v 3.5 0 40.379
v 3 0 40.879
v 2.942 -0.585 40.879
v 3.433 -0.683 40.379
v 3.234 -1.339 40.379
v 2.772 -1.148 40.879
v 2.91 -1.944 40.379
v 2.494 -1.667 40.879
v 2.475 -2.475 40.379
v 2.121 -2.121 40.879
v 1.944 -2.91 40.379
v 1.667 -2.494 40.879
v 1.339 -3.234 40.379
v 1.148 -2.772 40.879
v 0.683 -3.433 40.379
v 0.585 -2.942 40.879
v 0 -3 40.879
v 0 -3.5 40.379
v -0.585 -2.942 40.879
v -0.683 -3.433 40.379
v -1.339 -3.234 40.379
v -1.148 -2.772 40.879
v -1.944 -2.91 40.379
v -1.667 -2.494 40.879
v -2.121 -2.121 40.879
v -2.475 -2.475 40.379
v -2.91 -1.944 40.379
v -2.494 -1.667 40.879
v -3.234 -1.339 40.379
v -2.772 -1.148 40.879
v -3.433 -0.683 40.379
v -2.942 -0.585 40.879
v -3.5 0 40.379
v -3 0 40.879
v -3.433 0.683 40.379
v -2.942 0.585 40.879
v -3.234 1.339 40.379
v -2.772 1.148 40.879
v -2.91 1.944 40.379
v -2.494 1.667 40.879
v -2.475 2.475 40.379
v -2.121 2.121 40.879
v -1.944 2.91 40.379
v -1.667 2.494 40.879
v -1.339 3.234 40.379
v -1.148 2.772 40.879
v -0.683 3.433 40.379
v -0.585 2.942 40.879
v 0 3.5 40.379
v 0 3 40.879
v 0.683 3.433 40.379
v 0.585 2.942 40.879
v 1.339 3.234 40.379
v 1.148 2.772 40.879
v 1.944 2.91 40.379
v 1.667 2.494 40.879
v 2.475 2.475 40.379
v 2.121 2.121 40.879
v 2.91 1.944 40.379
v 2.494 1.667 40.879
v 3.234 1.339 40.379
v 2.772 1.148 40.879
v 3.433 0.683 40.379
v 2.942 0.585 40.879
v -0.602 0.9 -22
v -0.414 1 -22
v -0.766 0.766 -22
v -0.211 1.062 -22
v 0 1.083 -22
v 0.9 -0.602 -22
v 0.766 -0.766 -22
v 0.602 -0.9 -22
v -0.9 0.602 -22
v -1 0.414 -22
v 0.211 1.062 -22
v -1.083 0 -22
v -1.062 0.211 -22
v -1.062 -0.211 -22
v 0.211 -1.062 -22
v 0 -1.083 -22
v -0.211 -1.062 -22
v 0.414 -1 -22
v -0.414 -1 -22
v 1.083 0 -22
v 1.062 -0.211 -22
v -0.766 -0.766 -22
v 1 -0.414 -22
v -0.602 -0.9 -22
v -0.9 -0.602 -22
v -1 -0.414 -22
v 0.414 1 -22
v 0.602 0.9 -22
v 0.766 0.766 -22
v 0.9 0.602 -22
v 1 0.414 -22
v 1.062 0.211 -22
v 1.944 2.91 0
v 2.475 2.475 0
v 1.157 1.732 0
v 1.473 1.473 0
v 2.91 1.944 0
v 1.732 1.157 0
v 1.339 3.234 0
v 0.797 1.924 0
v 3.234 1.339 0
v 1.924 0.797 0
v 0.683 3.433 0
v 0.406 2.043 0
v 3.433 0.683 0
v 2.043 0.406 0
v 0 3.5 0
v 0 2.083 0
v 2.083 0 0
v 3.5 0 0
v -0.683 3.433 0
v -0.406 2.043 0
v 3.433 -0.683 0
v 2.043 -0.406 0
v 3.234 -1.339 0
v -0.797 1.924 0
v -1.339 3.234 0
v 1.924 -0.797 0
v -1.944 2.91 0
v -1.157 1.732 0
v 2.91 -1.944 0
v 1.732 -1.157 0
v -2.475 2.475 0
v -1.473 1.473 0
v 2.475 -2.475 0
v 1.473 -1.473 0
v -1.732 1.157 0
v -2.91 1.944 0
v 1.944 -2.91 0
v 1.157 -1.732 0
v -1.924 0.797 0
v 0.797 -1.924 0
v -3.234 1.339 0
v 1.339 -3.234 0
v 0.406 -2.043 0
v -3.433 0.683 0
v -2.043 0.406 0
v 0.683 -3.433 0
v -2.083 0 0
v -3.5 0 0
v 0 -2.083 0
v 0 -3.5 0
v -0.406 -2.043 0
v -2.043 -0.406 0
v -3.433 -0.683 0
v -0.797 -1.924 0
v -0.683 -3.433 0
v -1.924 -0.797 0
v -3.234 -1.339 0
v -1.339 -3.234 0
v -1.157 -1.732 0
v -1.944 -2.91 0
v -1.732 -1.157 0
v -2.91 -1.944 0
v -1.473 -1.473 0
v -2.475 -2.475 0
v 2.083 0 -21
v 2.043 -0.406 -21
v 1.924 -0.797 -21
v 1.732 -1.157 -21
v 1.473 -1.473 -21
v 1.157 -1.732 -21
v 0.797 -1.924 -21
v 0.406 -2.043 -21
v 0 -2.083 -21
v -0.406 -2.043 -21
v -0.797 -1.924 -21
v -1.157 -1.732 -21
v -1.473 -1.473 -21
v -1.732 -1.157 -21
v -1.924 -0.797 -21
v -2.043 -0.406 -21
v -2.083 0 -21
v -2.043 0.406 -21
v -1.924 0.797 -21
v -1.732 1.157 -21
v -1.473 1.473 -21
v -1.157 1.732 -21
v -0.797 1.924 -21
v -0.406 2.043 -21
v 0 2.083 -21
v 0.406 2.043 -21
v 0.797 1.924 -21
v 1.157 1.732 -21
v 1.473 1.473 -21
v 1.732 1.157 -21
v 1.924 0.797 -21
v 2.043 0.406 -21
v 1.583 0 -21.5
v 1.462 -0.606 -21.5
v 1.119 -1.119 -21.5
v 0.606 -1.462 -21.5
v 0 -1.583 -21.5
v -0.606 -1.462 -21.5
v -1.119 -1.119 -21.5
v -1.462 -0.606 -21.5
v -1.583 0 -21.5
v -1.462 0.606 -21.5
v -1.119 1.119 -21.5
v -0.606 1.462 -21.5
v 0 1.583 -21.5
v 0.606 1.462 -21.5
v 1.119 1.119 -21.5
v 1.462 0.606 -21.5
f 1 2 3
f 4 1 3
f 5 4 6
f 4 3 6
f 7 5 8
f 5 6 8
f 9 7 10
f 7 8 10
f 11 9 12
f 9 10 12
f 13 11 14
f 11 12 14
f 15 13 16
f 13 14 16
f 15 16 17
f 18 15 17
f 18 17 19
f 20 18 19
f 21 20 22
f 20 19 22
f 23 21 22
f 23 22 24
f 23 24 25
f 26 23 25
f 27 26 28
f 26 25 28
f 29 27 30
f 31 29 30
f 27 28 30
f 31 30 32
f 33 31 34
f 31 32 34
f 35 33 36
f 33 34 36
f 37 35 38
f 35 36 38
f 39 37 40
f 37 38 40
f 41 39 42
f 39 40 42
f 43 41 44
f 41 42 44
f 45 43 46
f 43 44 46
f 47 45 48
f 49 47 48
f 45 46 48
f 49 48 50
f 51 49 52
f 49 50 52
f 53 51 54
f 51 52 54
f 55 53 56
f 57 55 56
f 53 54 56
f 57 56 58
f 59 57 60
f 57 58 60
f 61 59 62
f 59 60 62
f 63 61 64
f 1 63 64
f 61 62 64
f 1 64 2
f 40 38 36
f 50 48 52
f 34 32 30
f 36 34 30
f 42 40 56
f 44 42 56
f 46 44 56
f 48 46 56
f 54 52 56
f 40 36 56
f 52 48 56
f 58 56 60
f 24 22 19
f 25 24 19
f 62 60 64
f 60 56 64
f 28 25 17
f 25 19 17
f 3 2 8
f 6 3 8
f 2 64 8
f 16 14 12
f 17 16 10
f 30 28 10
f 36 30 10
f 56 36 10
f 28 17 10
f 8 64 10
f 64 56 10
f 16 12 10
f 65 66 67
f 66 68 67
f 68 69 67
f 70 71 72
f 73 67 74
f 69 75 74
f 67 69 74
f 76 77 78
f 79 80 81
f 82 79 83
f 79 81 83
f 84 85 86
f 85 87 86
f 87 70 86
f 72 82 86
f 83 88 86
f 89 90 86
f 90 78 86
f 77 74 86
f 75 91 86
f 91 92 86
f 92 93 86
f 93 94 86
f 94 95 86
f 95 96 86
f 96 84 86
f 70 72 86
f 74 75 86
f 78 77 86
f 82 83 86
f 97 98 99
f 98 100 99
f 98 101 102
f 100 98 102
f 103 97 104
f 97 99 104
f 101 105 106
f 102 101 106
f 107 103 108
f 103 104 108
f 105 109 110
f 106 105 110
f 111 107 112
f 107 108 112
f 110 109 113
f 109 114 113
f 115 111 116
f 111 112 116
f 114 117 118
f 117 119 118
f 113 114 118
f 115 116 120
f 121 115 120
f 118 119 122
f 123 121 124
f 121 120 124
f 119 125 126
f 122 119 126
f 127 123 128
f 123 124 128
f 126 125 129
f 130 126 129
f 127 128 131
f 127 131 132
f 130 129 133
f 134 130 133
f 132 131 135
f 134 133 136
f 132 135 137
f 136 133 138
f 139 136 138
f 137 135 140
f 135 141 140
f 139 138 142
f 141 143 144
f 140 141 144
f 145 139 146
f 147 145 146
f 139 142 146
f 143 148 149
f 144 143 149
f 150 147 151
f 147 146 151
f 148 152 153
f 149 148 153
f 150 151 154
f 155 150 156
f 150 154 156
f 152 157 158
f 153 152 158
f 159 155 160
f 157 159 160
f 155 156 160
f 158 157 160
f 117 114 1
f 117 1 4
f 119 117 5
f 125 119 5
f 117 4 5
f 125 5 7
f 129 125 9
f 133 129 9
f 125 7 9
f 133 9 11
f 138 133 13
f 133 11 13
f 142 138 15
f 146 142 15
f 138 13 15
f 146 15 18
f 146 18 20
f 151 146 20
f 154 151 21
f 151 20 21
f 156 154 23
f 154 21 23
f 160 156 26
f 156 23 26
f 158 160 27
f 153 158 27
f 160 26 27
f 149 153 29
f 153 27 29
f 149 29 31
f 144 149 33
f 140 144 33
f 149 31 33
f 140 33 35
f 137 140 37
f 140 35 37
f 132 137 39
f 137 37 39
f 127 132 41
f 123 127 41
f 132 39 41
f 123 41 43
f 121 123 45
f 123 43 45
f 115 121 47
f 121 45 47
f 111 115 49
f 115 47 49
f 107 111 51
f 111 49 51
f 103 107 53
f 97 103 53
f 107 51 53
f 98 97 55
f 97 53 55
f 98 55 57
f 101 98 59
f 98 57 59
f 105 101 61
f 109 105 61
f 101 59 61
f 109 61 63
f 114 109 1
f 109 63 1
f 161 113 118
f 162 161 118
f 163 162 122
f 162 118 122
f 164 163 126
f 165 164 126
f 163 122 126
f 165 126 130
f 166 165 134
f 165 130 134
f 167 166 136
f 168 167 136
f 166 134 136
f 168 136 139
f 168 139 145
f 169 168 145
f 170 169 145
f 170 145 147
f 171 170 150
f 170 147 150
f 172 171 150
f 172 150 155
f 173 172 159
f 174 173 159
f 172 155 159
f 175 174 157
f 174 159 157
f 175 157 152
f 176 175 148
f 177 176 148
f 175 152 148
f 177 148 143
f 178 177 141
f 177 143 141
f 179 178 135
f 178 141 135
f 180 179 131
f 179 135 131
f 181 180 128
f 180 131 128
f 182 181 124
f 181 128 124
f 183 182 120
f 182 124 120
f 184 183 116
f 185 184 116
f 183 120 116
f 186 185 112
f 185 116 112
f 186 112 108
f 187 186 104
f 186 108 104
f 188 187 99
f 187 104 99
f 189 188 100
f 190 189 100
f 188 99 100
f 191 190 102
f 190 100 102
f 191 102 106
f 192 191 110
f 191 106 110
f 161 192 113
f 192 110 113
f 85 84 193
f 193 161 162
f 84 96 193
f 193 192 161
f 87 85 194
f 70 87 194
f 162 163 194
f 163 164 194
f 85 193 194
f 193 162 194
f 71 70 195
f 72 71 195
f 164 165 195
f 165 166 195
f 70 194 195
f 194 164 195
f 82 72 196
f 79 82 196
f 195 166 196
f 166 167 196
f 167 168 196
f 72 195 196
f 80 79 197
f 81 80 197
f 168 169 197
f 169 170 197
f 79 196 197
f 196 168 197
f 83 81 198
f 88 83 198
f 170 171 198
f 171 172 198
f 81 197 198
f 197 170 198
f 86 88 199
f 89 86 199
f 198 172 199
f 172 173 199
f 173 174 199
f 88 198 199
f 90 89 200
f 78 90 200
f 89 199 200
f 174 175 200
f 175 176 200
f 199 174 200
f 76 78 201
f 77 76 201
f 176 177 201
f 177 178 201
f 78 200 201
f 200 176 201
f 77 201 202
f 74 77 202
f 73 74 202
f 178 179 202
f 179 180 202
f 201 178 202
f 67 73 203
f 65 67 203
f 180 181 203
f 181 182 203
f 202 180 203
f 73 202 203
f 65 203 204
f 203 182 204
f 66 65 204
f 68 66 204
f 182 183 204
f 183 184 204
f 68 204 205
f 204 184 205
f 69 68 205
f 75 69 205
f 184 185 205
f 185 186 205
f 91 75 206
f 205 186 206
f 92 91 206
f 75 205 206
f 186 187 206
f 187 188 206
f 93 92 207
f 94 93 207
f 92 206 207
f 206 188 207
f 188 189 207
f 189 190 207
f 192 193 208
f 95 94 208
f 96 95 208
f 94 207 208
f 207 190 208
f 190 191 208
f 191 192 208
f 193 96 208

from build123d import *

# Parameters (mm, degrees)
CHAMFER1_SIZE = 1
CHAMFER2_SIZE = 0.5


with BuildPart() as part:
    # Sketch1 → Revolve1 (revolve)
    with BuildSketch(Plane(origin=(0, 0, 0), x_dir=(0, 0, -1), z_dir=(1, 0, 0)), mode=Mode.PRIVATE) as revolve1_sk:
        Polygon((22, 0), (22, 2.0828), (0, 2.0828), (0, 3.5), (-40.879, 3.5), (-40.879, 0), align=None)
    revolve(revolve1_sk.sketch.rotate(Axis((0, 0, 0), (0, 0, -1)), 90), axis=Axis((0, 0, 0), (0, 0, -1)))  # turned: the seam where the file's is

    # Chamfer1
    chamfer1_edges = [part.edges().sort_by_distance(p)[0] for p in [
        (-2.0828, 0, -22),
    ]]
    chamfer(chamfer1_edges, length=CHAMFER1_SIZE)

    # Chamfer2
    chamfer2_edges = [part.edges().sort_by_distance(p)[0] for p in [
        (-3.5, 0, 40.879),
    ]]
    chamfer(chamfer2_edges, length=CHAMFER2_SIZE)


solid = part.part
